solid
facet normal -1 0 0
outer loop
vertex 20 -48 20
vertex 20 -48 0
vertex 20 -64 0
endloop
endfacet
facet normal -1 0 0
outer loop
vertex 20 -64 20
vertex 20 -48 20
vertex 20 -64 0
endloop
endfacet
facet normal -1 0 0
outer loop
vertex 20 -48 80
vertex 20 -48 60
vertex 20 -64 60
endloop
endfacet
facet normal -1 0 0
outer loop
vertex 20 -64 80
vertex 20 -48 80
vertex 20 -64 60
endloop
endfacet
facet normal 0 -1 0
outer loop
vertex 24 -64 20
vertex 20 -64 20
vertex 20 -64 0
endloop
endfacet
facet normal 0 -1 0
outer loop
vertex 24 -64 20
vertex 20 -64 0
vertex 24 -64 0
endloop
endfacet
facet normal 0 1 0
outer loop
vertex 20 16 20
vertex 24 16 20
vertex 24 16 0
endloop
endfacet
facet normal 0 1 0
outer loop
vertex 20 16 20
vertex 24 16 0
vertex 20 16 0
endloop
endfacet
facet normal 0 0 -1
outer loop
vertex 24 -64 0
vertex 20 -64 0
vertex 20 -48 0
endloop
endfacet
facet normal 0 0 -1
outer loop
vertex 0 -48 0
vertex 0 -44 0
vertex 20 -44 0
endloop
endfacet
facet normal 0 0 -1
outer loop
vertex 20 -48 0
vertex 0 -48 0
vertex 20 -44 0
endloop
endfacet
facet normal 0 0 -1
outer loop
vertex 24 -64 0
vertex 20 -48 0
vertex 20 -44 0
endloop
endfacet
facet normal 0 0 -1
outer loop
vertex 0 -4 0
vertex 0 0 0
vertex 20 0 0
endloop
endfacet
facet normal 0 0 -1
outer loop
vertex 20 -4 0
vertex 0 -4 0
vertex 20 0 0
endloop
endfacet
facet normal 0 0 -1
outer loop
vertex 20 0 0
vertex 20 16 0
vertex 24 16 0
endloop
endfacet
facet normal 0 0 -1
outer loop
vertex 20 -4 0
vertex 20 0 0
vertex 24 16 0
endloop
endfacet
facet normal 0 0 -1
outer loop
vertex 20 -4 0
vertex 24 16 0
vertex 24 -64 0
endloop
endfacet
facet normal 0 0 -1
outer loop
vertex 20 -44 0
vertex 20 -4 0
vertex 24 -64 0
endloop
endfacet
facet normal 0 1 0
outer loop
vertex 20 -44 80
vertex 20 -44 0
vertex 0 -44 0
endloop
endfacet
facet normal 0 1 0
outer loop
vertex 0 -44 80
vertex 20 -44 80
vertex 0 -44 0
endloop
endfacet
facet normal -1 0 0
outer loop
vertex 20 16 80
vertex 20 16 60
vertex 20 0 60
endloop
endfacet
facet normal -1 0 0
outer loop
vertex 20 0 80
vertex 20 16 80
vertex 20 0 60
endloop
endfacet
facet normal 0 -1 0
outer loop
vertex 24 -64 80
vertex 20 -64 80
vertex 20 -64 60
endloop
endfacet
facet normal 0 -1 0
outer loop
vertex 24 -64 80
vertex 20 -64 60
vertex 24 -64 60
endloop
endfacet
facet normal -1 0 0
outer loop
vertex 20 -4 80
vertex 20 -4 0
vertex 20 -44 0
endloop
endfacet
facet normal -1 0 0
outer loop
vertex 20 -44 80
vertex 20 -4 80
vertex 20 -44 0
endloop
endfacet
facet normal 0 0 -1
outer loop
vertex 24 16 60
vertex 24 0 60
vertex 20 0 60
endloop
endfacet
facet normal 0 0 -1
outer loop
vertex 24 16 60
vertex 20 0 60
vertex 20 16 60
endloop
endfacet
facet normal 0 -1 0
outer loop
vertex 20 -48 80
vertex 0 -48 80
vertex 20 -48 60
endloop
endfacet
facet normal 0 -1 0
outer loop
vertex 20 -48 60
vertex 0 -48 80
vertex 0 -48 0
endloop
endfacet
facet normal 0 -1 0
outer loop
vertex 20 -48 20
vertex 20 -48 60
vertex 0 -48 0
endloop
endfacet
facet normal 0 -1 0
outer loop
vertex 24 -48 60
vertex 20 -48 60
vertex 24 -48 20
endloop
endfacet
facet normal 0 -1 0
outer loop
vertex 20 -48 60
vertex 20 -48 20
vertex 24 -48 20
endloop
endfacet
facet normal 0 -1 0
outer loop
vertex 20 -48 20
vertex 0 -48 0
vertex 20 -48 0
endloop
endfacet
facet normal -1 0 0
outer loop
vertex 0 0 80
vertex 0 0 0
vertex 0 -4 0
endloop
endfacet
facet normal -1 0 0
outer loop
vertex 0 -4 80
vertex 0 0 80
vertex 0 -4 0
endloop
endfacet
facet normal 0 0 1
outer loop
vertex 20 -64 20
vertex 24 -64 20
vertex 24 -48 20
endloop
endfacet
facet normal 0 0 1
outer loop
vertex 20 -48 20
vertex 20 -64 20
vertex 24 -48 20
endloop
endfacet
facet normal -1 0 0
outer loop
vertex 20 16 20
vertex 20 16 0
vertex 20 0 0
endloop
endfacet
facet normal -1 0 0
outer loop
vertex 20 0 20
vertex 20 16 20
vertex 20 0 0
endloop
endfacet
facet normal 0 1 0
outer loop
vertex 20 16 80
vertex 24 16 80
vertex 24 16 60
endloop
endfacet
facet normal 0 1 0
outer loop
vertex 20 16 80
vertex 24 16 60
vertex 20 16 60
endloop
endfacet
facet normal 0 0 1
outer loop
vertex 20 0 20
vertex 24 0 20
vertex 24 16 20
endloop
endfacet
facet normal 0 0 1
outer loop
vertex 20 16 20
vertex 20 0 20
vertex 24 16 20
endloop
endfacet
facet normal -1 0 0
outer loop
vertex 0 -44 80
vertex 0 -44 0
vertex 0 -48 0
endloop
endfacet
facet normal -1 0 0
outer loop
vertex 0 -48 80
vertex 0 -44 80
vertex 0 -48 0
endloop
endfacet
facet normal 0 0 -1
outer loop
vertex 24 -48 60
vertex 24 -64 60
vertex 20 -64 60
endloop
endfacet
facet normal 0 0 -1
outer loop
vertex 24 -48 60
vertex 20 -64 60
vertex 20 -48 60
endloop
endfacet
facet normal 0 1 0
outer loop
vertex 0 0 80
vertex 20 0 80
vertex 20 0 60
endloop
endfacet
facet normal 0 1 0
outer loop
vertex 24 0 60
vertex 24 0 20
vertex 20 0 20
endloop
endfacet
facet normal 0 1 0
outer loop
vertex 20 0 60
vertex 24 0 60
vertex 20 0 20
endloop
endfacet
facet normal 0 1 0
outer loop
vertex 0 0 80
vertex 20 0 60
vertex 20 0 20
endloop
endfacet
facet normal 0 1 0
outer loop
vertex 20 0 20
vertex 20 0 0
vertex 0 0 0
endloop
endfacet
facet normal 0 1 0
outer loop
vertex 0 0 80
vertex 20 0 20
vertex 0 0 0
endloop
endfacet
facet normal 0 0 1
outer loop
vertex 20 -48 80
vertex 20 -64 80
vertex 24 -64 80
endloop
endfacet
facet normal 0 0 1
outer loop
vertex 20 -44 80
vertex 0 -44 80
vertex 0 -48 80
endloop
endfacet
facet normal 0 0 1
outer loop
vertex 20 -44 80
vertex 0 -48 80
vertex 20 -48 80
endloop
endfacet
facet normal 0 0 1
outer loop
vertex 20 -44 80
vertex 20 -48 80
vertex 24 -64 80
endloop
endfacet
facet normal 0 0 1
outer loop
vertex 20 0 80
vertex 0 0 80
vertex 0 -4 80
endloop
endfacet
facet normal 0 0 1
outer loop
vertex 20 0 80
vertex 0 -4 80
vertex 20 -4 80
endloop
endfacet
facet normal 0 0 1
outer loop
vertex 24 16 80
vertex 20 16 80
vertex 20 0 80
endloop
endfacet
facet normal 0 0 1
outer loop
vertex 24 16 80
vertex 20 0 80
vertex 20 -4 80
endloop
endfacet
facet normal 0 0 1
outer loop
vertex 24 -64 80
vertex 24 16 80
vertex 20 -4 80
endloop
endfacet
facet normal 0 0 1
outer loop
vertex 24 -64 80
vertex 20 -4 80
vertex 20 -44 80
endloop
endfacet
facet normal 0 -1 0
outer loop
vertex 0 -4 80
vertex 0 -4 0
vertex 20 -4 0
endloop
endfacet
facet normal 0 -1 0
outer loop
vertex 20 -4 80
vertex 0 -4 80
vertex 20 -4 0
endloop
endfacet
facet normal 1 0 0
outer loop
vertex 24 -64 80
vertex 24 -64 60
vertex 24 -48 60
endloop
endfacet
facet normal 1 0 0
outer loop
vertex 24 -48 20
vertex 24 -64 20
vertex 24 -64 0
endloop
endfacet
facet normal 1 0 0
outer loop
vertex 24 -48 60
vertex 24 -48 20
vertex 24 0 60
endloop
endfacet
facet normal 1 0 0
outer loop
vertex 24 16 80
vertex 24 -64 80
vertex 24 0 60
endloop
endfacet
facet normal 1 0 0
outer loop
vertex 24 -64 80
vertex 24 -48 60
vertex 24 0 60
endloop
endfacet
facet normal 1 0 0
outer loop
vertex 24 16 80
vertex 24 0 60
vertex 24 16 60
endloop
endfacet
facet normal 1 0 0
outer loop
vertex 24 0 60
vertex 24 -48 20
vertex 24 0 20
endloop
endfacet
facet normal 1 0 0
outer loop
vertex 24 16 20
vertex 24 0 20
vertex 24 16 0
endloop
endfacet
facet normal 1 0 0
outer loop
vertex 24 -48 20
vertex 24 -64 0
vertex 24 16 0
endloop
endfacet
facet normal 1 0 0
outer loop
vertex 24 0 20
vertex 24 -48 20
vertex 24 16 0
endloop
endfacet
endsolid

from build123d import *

# Parameters (mm, degrees)
F1_DEPTH = 80
F2_W     = 16
F2_H     = 40
F3_DEPTH = 24.001


with BuildPart() as f1:
    # F0 (on Top) → F1 (new body)
    with BuildSketch(Plane.XY):
        Polygon((20, 0), (0, 0), (0, -4), (20, -4), (20, -44), (0, -44), (0, -48), (20, -48), (20, -64), (24, -64), (24, 16), (20, 16), align=None)
    extrude(amount=F1_DEPTH)

    # F2 (on face) → F3 (cut, through all)
    with BuildSketch(Plane.YZ.offset(24)):
        with Locations((8, 40)):
            Rectangle(F2_W, F2_H)
        with Locations((-56, 40)):
            Rectangle(F2_W, F2_H)
    extrude(amount=-F3_DEPTH, mode=Mode.SUBTRACT)


solid = f1.part
